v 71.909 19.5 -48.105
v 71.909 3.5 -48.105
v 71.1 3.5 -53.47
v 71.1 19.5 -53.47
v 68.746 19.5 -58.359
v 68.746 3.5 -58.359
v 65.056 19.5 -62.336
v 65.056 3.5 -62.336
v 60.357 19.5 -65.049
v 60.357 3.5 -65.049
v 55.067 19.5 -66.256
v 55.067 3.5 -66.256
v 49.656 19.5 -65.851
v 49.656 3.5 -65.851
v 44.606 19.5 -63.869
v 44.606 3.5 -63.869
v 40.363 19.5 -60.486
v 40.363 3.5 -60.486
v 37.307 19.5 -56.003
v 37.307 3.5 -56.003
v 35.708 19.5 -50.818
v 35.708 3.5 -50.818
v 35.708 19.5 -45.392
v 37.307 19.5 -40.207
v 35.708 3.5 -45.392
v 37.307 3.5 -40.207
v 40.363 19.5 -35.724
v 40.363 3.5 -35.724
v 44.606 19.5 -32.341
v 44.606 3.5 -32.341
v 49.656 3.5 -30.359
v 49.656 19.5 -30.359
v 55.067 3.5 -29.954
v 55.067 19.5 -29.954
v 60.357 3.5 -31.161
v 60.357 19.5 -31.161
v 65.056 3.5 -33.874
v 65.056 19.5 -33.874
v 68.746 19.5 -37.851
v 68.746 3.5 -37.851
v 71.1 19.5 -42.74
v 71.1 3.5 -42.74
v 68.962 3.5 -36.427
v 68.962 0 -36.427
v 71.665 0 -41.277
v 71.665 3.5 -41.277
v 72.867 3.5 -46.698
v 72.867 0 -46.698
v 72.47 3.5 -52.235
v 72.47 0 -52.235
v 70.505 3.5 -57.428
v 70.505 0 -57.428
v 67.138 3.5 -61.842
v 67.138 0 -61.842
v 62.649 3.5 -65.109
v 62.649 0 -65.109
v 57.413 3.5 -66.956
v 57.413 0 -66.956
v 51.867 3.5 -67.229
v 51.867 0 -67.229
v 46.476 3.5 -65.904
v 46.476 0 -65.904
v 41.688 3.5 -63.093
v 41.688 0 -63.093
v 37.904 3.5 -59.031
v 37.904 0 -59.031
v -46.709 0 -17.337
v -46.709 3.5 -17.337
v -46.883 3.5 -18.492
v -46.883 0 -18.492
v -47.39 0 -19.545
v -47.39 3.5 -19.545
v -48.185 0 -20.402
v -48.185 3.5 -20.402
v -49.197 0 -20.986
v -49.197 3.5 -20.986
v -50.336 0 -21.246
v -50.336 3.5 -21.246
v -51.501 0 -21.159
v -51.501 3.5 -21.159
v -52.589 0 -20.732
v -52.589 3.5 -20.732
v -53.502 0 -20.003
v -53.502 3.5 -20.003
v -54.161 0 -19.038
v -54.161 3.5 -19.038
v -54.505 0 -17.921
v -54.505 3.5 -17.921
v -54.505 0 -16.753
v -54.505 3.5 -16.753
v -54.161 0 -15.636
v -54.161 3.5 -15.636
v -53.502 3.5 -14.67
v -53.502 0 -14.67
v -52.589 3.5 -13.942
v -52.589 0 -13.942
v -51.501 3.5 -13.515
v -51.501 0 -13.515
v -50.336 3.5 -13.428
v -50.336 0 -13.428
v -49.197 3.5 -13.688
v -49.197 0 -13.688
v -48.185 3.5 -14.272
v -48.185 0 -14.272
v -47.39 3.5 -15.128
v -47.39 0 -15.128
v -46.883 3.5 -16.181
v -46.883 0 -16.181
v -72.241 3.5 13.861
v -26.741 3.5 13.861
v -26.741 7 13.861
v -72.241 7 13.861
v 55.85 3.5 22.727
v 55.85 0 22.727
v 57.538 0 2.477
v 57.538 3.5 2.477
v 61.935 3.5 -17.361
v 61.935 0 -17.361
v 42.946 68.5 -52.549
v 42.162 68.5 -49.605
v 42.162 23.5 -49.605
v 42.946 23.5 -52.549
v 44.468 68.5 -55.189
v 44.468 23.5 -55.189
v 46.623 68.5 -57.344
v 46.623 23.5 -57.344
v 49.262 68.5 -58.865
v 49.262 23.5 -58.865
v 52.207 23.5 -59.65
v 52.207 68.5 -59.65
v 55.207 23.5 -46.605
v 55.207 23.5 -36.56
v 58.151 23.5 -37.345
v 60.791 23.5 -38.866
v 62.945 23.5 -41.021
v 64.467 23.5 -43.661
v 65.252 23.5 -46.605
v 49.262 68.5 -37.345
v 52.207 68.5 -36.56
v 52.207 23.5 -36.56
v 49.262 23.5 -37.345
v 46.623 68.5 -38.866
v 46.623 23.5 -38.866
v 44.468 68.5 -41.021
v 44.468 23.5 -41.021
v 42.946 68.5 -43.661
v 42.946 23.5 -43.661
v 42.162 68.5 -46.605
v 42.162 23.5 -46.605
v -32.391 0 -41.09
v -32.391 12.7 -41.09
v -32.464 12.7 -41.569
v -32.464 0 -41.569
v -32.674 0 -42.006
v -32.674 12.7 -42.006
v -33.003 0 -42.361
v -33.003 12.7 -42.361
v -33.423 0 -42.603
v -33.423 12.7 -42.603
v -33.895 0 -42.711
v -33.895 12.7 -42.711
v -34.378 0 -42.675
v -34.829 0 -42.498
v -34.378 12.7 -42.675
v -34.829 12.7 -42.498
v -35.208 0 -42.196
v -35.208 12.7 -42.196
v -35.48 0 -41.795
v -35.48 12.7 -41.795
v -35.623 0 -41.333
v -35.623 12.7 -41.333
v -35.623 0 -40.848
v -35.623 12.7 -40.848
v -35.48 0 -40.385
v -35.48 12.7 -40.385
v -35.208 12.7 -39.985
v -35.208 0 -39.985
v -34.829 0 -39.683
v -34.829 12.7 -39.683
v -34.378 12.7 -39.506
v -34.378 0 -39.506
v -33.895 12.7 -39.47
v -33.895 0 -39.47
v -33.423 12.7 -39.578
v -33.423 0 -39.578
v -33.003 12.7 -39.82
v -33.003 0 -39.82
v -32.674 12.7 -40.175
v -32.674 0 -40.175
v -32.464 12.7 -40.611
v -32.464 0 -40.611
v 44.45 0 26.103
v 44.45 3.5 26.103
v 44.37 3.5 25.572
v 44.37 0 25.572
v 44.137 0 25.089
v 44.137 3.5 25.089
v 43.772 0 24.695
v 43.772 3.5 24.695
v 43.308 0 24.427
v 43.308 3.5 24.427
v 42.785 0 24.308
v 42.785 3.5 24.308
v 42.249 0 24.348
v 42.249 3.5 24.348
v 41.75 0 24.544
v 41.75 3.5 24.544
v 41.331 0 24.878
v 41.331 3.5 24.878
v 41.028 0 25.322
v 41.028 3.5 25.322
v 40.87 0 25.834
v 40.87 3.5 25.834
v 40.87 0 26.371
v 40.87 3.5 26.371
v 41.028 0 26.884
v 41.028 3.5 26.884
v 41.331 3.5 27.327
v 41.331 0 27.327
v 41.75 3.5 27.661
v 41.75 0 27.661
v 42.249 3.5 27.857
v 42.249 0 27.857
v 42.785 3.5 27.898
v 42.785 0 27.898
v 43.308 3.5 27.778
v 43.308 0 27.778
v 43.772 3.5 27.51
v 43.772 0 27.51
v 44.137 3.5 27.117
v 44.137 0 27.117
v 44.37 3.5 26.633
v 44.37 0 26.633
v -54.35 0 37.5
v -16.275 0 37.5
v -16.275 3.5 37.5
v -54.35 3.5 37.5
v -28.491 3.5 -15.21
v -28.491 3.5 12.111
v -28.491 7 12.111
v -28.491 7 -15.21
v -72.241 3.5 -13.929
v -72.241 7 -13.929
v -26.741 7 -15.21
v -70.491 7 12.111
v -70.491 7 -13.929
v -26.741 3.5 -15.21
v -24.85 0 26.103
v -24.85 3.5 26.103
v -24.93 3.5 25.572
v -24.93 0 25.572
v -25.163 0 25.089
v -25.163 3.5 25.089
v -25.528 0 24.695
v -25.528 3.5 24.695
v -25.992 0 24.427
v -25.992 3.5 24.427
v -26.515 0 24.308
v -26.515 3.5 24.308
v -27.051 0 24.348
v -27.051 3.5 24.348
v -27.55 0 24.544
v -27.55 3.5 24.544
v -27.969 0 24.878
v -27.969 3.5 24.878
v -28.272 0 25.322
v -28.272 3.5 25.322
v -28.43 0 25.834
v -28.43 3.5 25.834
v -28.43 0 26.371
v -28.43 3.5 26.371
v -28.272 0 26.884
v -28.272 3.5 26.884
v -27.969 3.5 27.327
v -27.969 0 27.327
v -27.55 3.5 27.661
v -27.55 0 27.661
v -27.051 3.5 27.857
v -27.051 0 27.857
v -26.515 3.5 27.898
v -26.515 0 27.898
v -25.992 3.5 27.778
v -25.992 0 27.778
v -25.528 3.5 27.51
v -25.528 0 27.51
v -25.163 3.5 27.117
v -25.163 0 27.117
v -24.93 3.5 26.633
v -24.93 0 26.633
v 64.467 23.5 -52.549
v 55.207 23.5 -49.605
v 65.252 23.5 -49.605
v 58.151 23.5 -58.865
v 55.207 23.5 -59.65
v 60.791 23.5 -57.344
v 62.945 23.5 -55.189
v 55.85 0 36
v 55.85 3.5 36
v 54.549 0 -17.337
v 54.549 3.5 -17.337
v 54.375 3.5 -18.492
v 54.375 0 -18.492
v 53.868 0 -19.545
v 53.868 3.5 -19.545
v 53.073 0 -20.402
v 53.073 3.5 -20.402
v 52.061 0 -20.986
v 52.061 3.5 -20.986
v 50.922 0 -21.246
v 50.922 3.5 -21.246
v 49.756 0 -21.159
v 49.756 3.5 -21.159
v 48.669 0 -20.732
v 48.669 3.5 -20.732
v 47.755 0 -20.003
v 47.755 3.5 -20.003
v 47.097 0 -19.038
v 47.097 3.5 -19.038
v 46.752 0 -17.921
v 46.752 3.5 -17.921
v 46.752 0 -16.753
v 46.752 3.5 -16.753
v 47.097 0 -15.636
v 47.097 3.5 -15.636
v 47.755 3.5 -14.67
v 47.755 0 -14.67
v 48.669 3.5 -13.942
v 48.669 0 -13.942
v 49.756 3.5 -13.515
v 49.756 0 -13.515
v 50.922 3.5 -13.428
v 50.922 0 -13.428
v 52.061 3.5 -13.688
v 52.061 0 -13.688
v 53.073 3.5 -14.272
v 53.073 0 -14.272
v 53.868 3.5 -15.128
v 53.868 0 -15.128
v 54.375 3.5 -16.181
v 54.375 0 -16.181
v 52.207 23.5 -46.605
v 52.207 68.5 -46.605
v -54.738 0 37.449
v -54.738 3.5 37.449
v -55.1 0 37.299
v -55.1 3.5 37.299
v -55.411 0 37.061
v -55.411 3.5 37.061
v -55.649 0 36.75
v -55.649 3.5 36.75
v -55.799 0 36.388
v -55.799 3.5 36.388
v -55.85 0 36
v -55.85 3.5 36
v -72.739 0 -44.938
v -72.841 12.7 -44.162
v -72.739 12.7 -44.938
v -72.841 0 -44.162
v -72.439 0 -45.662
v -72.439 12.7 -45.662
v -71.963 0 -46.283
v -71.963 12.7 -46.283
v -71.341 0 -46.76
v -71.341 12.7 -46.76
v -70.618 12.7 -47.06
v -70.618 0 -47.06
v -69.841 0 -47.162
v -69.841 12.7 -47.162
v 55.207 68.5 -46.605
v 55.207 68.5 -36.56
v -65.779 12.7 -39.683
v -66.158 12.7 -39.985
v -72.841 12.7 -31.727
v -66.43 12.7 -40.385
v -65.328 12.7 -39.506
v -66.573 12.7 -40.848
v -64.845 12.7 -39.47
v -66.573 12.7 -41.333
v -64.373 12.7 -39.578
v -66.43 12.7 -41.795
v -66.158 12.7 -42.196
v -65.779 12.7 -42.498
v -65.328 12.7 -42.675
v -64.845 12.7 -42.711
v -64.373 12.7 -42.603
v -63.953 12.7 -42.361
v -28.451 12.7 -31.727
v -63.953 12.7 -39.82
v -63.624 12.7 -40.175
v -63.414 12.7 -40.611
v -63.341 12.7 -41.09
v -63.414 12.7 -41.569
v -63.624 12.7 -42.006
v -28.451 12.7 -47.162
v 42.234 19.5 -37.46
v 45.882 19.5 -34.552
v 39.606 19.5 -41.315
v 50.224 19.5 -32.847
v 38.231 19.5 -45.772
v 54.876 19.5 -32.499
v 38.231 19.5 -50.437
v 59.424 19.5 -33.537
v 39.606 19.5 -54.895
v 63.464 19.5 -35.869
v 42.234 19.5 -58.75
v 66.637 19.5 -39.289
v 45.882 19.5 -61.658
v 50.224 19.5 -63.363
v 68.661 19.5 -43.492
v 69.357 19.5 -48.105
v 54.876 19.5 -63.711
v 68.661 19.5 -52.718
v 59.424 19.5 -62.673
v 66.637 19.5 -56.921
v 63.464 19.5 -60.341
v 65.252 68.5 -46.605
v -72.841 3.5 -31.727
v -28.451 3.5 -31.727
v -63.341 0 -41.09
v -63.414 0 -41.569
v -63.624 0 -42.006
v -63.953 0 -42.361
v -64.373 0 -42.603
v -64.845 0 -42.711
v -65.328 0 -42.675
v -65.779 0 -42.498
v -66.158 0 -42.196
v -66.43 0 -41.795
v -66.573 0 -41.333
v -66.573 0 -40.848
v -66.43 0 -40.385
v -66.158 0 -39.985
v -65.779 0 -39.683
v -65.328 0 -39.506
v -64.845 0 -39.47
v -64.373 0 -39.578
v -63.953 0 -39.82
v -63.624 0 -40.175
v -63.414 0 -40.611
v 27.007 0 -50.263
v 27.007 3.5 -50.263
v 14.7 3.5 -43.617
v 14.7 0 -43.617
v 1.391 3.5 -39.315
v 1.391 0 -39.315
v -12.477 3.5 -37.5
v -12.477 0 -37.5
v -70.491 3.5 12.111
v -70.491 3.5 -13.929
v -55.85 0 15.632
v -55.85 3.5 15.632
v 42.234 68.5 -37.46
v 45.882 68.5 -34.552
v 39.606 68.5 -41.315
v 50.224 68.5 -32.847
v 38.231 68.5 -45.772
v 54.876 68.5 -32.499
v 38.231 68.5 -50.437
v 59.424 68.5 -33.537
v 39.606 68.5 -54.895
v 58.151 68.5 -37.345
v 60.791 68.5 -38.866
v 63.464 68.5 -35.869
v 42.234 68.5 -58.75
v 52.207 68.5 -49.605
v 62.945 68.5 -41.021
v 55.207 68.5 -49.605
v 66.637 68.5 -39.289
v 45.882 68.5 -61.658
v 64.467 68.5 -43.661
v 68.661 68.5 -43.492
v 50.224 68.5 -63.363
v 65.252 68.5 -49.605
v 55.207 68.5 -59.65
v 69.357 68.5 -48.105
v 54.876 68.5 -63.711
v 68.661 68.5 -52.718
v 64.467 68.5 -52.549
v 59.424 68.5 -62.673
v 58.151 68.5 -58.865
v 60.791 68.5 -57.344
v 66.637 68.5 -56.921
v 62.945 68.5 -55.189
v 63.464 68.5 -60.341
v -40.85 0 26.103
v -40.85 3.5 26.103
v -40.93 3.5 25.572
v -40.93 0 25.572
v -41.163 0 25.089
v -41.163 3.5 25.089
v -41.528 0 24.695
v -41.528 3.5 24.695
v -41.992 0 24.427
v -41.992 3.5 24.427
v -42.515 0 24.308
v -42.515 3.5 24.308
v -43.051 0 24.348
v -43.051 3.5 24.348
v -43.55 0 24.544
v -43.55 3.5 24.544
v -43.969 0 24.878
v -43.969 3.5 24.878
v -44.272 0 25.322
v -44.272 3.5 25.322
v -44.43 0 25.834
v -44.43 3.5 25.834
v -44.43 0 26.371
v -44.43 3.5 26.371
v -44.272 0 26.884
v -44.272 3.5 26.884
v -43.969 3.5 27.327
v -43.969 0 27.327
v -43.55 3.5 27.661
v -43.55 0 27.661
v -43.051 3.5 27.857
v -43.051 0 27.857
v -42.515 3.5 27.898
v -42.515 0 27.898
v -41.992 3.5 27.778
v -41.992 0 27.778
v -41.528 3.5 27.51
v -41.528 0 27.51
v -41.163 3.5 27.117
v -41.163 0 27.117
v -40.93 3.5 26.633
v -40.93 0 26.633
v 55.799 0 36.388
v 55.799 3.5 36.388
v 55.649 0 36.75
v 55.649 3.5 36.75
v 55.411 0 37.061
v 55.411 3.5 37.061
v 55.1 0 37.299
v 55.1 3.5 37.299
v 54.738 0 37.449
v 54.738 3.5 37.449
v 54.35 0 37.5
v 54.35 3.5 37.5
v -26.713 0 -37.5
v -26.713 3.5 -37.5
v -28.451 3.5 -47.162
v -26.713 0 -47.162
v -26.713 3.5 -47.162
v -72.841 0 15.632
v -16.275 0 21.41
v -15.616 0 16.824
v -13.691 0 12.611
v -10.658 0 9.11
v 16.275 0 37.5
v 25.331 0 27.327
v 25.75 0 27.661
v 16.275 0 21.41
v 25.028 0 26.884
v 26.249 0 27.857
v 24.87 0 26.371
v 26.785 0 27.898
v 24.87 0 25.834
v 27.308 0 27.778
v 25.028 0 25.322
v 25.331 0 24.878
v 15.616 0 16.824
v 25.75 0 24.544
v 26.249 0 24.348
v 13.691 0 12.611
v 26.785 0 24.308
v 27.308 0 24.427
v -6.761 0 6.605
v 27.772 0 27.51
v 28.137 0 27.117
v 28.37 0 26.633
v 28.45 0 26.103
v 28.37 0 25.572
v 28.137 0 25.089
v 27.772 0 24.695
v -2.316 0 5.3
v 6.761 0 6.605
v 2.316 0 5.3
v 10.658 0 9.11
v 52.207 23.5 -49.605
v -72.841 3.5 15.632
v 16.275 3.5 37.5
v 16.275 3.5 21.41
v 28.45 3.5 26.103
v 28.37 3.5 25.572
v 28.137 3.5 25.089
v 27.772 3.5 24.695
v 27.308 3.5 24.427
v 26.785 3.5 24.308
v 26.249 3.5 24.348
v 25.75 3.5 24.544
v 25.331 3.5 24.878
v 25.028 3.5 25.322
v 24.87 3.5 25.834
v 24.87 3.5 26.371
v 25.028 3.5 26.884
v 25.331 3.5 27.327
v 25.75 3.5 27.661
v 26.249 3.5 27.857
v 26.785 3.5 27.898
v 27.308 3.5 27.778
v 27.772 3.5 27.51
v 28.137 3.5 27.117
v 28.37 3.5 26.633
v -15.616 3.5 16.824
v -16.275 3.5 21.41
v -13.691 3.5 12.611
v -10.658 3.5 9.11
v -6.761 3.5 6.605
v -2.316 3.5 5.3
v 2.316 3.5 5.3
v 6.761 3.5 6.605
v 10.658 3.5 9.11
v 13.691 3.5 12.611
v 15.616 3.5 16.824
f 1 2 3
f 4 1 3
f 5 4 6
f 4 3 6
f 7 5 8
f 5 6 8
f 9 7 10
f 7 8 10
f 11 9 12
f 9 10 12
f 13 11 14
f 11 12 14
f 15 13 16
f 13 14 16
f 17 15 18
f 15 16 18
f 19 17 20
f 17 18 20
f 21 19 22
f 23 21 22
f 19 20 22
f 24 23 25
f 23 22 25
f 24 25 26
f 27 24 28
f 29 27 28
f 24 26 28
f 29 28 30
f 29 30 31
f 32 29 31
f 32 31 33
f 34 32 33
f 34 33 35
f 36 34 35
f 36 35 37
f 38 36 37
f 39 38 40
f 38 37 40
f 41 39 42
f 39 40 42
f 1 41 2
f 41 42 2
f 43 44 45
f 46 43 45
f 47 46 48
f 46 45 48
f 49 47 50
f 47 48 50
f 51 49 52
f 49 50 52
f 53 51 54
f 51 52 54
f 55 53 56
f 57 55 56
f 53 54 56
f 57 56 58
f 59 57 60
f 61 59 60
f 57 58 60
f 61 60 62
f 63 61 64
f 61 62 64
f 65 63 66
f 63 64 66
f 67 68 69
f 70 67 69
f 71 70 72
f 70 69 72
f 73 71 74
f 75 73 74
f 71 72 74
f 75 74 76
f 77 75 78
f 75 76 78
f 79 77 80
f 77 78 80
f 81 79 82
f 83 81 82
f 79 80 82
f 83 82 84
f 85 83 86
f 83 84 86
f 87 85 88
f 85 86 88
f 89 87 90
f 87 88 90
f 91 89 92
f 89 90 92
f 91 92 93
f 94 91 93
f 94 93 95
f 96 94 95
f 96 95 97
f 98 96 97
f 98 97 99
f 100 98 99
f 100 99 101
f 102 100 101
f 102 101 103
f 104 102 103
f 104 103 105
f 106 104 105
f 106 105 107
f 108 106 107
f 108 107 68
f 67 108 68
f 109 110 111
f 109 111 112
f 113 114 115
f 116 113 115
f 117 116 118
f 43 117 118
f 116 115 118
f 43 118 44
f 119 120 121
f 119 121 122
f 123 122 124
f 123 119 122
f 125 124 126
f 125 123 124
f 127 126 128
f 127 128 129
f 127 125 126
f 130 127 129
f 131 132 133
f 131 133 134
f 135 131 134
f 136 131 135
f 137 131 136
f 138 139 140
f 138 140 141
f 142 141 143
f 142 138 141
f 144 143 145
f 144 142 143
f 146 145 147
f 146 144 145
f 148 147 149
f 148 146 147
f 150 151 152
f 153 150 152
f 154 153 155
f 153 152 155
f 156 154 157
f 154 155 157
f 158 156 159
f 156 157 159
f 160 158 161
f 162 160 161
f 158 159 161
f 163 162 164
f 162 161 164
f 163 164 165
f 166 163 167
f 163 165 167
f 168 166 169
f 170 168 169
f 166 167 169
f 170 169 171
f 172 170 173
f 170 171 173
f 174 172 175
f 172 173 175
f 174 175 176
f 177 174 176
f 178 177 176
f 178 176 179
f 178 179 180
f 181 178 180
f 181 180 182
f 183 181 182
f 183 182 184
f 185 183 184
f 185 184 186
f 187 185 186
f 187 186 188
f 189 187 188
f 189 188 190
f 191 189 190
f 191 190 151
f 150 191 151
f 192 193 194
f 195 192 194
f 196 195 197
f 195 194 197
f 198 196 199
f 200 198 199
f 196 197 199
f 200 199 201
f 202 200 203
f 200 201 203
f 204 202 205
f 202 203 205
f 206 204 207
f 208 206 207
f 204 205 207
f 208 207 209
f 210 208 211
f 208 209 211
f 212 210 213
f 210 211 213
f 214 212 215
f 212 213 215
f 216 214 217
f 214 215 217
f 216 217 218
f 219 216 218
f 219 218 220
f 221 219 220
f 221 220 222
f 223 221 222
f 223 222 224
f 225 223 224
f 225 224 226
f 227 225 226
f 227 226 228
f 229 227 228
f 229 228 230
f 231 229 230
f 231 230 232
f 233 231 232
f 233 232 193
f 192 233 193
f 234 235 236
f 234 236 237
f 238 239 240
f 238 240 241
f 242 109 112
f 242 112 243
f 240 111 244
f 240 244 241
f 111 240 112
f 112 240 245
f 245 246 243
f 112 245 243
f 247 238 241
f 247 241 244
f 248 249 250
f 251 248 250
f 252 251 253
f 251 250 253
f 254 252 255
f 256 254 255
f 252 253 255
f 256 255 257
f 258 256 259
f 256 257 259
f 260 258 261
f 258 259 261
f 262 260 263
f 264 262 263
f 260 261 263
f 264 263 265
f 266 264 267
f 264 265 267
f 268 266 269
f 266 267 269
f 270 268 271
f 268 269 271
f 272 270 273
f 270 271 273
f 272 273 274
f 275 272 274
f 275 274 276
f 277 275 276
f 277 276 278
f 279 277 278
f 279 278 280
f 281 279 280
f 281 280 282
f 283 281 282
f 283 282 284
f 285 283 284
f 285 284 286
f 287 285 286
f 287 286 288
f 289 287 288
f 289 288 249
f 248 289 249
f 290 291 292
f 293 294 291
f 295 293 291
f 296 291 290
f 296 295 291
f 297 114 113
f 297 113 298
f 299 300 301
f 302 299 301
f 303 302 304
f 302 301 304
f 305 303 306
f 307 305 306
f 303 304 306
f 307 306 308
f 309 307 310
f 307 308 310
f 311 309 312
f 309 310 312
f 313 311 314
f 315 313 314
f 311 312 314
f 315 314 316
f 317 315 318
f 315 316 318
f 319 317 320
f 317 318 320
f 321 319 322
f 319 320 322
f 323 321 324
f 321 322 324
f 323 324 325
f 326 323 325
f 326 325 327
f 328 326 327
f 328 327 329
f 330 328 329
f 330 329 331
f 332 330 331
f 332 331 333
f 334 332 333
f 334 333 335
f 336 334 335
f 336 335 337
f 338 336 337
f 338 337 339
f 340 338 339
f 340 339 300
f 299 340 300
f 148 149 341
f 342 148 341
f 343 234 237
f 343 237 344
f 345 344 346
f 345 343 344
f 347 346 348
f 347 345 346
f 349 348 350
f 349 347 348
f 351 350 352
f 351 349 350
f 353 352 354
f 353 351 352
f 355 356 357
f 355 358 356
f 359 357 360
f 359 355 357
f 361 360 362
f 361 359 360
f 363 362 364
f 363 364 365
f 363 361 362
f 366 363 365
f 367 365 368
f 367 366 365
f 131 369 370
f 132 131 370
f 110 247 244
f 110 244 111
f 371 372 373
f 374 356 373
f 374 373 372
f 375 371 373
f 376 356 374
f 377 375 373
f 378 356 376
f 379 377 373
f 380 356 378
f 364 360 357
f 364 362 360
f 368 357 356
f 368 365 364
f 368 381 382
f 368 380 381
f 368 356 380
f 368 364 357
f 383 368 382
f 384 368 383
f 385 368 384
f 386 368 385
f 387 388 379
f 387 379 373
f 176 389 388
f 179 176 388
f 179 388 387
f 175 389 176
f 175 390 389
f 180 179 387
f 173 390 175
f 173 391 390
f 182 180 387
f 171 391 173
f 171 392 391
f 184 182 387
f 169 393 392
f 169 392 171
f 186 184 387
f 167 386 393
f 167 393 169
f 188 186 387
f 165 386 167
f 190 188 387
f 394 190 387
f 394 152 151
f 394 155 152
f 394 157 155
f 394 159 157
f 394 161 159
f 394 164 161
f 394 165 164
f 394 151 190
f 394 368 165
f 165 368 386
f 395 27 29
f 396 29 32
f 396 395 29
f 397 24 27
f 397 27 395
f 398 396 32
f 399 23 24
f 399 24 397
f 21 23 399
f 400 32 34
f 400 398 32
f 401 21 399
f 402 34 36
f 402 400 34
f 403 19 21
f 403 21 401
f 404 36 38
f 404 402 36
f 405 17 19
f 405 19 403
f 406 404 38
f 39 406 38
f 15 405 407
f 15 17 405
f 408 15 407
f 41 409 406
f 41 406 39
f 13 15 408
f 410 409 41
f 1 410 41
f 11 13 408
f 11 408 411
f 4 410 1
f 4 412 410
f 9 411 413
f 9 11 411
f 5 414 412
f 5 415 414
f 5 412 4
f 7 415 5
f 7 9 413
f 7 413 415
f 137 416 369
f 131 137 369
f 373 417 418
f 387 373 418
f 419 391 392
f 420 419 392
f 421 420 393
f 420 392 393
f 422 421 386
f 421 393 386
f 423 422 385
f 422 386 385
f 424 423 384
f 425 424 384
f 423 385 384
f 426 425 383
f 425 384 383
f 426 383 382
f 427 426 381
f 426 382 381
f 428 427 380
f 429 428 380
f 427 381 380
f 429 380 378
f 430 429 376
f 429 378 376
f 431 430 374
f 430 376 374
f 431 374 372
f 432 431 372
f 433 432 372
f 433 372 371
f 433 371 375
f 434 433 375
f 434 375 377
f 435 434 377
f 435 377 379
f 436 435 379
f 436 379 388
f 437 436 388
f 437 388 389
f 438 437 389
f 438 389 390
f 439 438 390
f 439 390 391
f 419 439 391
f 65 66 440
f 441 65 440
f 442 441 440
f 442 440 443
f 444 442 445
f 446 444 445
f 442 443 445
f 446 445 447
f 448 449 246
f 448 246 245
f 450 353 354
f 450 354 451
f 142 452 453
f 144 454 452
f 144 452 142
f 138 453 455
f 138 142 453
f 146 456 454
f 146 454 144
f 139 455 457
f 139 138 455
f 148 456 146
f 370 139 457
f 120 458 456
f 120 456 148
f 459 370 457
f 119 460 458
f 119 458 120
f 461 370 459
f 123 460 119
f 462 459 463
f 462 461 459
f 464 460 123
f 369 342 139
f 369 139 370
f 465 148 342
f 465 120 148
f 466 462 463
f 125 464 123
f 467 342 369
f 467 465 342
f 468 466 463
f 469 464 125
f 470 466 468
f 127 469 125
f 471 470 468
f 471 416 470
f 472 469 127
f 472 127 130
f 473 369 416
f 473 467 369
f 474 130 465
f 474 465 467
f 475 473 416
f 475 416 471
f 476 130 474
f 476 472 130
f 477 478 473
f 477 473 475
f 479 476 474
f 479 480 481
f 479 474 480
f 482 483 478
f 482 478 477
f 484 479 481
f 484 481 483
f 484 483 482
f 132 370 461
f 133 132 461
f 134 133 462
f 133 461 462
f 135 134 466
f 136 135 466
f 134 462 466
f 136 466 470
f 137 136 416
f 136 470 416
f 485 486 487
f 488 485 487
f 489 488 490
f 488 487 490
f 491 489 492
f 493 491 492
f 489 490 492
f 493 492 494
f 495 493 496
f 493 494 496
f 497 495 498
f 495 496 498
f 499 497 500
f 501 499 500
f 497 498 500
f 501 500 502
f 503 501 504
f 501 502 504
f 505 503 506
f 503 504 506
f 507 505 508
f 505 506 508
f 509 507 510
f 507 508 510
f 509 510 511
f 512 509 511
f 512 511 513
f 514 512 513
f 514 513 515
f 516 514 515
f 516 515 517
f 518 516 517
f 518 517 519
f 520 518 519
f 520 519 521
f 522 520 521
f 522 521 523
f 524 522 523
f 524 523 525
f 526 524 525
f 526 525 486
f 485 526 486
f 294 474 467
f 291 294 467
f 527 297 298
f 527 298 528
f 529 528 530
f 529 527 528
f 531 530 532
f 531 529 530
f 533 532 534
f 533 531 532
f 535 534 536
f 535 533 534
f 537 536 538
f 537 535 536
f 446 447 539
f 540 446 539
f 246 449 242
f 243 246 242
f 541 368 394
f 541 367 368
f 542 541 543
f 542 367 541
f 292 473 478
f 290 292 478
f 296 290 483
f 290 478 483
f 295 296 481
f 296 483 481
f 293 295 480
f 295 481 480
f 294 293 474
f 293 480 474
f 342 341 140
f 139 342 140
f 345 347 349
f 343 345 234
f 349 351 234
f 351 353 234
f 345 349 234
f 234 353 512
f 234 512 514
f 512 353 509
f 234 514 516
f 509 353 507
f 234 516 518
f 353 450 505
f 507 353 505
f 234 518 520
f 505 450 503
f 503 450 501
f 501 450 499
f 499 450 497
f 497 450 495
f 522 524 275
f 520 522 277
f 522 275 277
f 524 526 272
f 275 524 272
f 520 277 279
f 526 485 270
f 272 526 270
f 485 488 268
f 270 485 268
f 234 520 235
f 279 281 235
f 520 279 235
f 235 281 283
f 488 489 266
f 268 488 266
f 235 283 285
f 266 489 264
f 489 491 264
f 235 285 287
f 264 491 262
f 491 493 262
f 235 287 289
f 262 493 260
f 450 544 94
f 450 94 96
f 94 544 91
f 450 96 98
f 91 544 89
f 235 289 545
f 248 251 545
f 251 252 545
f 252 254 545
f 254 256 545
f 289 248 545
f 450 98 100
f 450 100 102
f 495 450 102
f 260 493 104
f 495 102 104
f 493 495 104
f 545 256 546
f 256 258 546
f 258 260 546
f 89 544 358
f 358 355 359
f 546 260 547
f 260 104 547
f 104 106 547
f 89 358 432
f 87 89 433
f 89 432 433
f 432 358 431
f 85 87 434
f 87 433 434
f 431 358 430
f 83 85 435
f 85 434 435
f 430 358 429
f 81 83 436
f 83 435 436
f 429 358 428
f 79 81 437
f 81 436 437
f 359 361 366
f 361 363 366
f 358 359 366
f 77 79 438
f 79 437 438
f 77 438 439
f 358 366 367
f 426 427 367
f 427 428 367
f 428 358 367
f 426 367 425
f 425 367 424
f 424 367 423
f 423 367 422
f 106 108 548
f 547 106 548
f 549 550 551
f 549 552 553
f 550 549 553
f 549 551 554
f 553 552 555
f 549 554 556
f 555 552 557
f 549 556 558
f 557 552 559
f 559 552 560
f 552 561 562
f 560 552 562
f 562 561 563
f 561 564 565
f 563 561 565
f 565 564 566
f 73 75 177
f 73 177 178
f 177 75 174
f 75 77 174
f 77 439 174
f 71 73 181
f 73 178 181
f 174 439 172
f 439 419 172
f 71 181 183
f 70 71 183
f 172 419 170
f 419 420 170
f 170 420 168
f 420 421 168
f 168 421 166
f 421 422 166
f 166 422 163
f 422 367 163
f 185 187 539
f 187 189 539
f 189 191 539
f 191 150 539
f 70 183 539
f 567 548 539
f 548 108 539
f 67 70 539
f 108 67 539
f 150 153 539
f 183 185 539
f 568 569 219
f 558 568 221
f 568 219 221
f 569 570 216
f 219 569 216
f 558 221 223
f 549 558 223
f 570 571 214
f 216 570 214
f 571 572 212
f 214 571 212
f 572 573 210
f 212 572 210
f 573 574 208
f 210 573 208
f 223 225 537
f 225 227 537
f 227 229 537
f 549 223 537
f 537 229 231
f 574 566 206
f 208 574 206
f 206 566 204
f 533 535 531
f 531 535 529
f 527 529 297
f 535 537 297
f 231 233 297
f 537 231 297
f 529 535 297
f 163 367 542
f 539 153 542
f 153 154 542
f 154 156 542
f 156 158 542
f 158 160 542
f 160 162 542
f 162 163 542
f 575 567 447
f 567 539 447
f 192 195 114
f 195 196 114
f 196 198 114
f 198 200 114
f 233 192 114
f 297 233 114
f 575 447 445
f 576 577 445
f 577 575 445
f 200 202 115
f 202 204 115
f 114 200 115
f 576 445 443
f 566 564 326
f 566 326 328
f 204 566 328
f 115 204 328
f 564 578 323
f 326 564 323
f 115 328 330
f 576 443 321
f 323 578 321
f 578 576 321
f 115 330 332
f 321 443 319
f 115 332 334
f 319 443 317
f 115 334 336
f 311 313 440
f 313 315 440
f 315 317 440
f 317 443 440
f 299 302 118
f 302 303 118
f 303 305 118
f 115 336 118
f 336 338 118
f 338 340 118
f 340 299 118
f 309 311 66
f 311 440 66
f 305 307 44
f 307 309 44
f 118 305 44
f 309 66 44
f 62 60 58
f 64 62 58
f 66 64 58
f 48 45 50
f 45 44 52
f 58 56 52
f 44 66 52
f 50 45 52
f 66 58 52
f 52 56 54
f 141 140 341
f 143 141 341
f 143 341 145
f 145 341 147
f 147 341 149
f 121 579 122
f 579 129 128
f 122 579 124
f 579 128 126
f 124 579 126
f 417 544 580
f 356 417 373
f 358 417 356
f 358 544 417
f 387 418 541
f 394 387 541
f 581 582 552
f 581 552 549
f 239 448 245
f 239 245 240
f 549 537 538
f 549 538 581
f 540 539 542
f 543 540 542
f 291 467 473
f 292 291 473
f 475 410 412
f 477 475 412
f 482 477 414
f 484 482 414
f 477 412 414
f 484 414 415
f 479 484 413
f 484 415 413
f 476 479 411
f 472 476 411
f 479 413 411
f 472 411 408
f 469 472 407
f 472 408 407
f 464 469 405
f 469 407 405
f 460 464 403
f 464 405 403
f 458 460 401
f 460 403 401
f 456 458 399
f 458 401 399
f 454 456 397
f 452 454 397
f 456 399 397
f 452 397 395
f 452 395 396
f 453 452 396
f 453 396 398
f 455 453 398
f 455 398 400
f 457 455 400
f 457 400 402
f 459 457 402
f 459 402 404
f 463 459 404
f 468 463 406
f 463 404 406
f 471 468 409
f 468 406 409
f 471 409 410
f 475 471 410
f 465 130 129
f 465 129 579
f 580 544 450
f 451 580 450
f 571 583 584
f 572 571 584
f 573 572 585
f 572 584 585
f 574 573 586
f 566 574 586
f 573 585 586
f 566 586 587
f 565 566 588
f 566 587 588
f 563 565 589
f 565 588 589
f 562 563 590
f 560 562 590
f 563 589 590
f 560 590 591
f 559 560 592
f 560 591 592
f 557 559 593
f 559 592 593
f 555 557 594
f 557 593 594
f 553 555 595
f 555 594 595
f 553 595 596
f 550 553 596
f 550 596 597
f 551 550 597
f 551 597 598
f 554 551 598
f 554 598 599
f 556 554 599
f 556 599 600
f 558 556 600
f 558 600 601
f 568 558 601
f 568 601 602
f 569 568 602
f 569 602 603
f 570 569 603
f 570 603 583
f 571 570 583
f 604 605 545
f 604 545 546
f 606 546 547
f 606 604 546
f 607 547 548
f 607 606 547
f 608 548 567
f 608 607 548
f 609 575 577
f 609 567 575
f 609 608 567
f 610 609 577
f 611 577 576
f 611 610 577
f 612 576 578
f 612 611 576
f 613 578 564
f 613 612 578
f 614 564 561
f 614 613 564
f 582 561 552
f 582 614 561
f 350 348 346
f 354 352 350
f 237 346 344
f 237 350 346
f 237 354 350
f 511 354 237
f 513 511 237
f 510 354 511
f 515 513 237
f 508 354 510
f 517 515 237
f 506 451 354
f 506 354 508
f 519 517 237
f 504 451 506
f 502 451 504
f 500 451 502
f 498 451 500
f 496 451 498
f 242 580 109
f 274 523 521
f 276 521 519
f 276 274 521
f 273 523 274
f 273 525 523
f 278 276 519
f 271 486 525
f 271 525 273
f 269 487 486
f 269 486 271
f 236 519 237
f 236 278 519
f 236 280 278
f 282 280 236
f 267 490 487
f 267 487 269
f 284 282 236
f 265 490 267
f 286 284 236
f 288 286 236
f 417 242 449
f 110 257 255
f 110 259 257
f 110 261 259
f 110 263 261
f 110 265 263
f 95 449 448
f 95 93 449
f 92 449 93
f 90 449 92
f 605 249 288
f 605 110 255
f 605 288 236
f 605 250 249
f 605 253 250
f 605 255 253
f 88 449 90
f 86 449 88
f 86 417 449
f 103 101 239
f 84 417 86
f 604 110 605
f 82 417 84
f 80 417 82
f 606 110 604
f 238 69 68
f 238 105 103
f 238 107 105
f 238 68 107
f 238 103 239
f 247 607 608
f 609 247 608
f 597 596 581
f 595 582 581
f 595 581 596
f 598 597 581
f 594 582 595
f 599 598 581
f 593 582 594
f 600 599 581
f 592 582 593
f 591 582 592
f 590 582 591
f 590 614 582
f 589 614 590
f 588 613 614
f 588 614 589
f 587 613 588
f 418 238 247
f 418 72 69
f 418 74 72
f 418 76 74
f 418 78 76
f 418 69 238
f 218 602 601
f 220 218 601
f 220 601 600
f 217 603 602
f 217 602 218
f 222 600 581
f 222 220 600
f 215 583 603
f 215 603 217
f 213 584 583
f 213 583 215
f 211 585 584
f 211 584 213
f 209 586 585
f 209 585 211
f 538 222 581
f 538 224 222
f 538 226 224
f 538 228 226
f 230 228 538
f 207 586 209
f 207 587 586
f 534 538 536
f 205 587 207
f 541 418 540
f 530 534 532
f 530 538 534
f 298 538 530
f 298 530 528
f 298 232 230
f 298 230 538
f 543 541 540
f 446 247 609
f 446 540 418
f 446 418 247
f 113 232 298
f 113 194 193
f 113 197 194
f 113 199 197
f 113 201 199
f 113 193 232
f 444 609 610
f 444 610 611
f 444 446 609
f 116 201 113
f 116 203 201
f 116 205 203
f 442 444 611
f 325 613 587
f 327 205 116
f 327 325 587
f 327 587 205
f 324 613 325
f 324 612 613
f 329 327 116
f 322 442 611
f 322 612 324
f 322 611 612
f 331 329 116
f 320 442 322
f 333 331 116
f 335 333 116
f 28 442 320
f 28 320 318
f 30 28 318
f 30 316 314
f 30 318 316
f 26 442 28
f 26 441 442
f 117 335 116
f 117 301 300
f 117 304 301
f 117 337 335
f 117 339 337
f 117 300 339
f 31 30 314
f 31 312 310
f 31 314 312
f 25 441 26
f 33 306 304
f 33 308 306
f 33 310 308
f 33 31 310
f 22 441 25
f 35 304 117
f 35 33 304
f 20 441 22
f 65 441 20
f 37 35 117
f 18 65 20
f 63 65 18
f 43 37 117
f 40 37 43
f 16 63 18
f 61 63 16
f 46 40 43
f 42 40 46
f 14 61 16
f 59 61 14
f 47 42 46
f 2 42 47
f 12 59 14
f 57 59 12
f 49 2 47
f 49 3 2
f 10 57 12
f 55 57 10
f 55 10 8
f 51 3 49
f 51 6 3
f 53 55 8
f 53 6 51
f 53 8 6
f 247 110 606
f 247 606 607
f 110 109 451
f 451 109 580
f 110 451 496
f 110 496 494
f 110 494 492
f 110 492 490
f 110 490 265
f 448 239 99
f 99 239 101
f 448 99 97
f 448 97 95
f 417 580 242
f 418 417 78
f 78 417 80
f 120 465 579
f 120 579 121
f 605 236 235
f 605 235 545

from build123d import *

# Parameters (mm, degrees)
BOSS_EXTRUDE1_DEPTH  = 3.5
SKETCH2_R            = 1.8
SKETCH2_R_2          = 3.920136022
CUT_EXTRUDE1_DEPTH   = 4
SKETCH3_R            = 15
BOSS_EXTRUDE2_DEPTH  = 3.5
SKETCH4_R            = 15
BOSS_EXTRUDE3_DEPTH  = 65
CUT_EXTRUDE2_DEPTH   = 45
BOSS_EXTRUDE4_DEPTH  = 3.5
SKETCH8_R            = 18.202220901
BOSS_EXTRUDE5_DEPTH  = 16
SKETCH9_R            = 15.776157057
SKETCH9_R_2          = 14
CUT_EXTRUDE3_DEPTH   = 49
BOSS_EXTRUDE6_DEPTH  = 3.5
BOSS_EXTRUDE7_DEPTH  = 3.5
SKETCH13_W           = 46.127934492
SKETCH13_H           = 9.661927398
BOSS_EXTRUDE8_DEPTH  = 3.5
SKETCH14_W           = 44.39062698
SKETCH14_H           = 15.435
BOSS_EXTRUDE9_DEPTH  = 9.2
CUT_EXTRUDE4_REACH   = 14.7
SKETCH15_R           = 1.625
FILLET3_R            = 3
SKETCH16_R           = 15.65
SKETCH16_R_2         = 14
BOSS_EXTRUDE10_DEPTH = 49


with BuildPart() as part:
    # Sketch1 → Boss-Extrude1 (new body)
    with BuildSketch(Plane(origin=(0, 0, 0), x_dir=(1, 0, 0), z_dir=(0, 1, 0))):
        with BuildLine():
            Line((-55.85, 37.5), (55.85, 37.5))
            Line((55.85, 37.5), (55.85, -36))
            ThreePointArc((55.85, -36), (55.410660172, -37.060660172), (54.35, -37.5))
            Line((54.35, -37.5), (-54.35, -37.5))
            ThreePointArc((-54.35, -37.5), (-55.410660172, -37.060660172), (-55.85, -36))
            Line((-55.85, -36), (-55.85, 37.5))
        make_face()
    extrude(amount=BOSS_EXTRUDE1_DEPTH)

    # Sketch2 → Cut-Extrude1 (cut)
    with BuildSketch(Plane(origin=(0, 3.5, 0), x_dir=(1, 0, 0), z_dir=(0, 1, 0))):
        with Locations((-42.65, -26.10257403)):
            Circle(SKETCH2_R)
        with Locations((-26.65, -26.10257403)):
            Circle(SKETCH2_R)
        with Locations((26.65, -26.10257403)):
            Circle(SKETCH2_R)
        with Locations((42.65, -26.10257403)):
            Circle(SKETCH2_R)
        with Locations((-50.62881184, 17.336768313)):
            Circle(SKETCH2_R_2)
        with Locations((50.62881184, 17.336768313)):
            Circle(SKETCH2_R_2)
        with BuildLine():
            Line((-16.275049205, -37.5), (-16.275049205, -21.409694211))
            ThreePointArc((-16.275049205, -21.409694211), (0, -5.134645006), (16.275049205, -21.409694211))
            Line((16.275049205, -21.409694211), (16.275049205, -37.5))
            Line((16.275049205, -37.5), (-16.275049205, -37.5))
        make_face()
    extrude(amount=-CUT_EXTRUDE1_DEPTH, mode=Mode.SUBTRACT)

    # Sketch3 → Boss-Extrude2 (add)
    with BuildSketch(Plane(origin=(0, 0, 0), x_dir=(1, 0, 0), z_dir=(0, 1, 0))):
        with Locations((53.706623558, 48.104964972)):
            Circle(SKETCH3_R)
    extrude(amount=BOSS_EXTRUDE2_DEPTH)

    # Sketch4 → Boss-Extrude3 (add)
    with BuildSketch(Plane(origin=(0, 3.5, 0), x_dir=(1, 0, 0), z_dir=(0, 1, 0))):
        with Locations((53.706623558, 48.104964972)):
            Circle(SKETCH4_R)
    extrude(amount=BOSS_EXTRUDE3_DEPTH)

    # Sketch5 → Cut-Extrude2 (cut)
    with BuildSketch(Plane(origin=(0, 68.5, 0), x_dir=(1, 0, 0), z_dir=(0, 1, 0))):
        with BuildLine():
            Line((42.161722237, 46.604964972), (52.206623558, 46.604964972))
            Line((52.206623558, 46.604964972), (52.206623558, 36.560063651))
            ThreePointArc((52.206623558, 36.560063651), (45.474529459, 39.872870873), (42.161722237, 46.604964972))
        make_face()
        with BuildLine():
            Line((65.251524879, 46.604964972), (55.206623558, 46.604964972))
            Line((55.206623558, 46.604964972), (55.206623558, 36.560063651))
            ThreePointArc((55.206623558, 36.560063651), (61.938717657, 39.872870873), (65.251524879, 46.604964972))
        make_face()
        with BuildLine():
            Line((55.206623558, 49.604964972), (65.251524879, 49.604964972))
            ThreePointArc((65.251524879, 49.604964972), (61.938717657, 56.337059071), (55.206623558, 59.649866293))
            Line((55.206623558, 59.649866293), (55.206623558, 49.604964972))
        make_face()
        with BuildLine():
            Line((52.206623558, 59.649866293), (52.206623558, 49.604964972))
            Line((52.206623558, 49.604964972), (42.161722237, 49.604964972))
            ThreePointArc((42.161722237, 49.604964972), (45.474529459, 56.337059071), (52.206623558, 59.649866293))
        make_face()
    extrude(amount=-CUT_EXTRUDE2_DEPTH, mode=Mode.SUBTRACT)

    # Sketch7 → Boss-Extrude4 (add)
    with BuildSketch(Plane(origin=(0, 0, 0), x_dir=(1, 0, 0), z_dir=(0, 1, 0))):
        with BuildLine():
            Line((-12.477353441, 37.5), (55.85, 37.5))
            Line((55.85, 37.5), (55.85, -22.727213829))
            ThreePointArc((55.85, -22.727213829), (59.401653411, 7.516004094), (68.962444737, 36.427208523))
            ThreePointArc((68.962444737, 36.427208523), (65.011720609, 63.638955321), (37.903565045, 59.030779228))
            ThreePointArc((37.903565045, 59.030779228), (14.699548646, 43.617215299), (-12.477353441, 37.5))
        make_face()
    extrude(amount=BOSS_EXTRUDE4_DEPTH)

    # Sketch8 → Boss-Extrude5 (add)
    with BuildSketch(Plane(origin=(0, 3.5, 0), x_dir=(1, 0, 0), z_dir=(0, 1, 0))):
        with Locations((53.706623558, 48.104964972)):
            Circle(SKETCH8_R)
    extrude(amount=BOSS_EXTRUDE5_DEPTH)

    # Sketch9 → Cut-Extrude3 (cut)
    with BuildSketch(Plane(origin=(0, 68.5, 0), x_dir=(1, 0, 0), z_dir=(0, 1, 0))):
        with Locations((53.706623558, 48.104964972)):
            Circle(SKETCH9_R)
        with Locations((53.706623558, 48.104964972)):
            Circle(SKETCH9_R_2, mode=Mode.SUBTRACT)
    extrude(amount=-CUT_EXTRUDE3_DEPTH, mode=Mode.SUBTRACT)

    # Sketch11 → Boss-Extrude6 (add)
    with BuildSketch(Plane(origin=(0, 0, 0), x_dir=(1, 0, 0), z_dir=(0, 1, 0))):
        Polygon((-55.85, 37.5), (-67.841357128, 37.5), (-72.841357128, 37.5), (-72.841357128, 32.5), (-72.841357128, -9.63182819), (-72.841357128, -15.63182819), (-66.841357128, -15.63182819), (-55.85, -15.63182819), (-55.85, -14.63182819), (-55.85, 0), align=None)
    extrude(amount=BOSS_EXTRUDE6_DEPTH)

    # Sketch12 → Boss-Extrude7 (add)
    with BuildSketch(Plane(origin=(0, 3.5, 0), x_dir=(1, 0, 0), z_dir=(0, 1, 0))):
        Polygon((-28.491357128, 15.210034265), (-26.741357128, 15.210034265), (-26.741357128, -13.861045819), (-72.241357128, -13.861045819), (-72.241357128, 13.92894421), (-71.491357128, 13.92894421), (-70.491357128, 13.92894421), (-70.491357128, -12.111045819), (-28.491357128, -12.111045819), align=None)
    extrude(amount=BOSS_EXTRUDE7_DEPTH)

    # Sketch13 → Boss-Extrude8 (add)
    with BuildSketch(Plane(origin=(0, 0, 0), x_dir=(1, 0, 0), z_dir=(0, 1, 0))):
        with Locations((-49.777389882, 42.330963699)):
            Rectangle(SKETCH13_W, SKETCH13_H)
    extrude(amount=BOSS_EXTRUDE8_DEPTH)

    # Sketch14 → Boss-Extrude9 (add)
    with BuildSketch(Plane(origin=(0, 3.5, 0), x_dir=(1, 0, 0), z_dir=(0, 1, 0))):
        with Locations((-50.646043638, 39.444427398)):
            Rectangle(SKETCH14_W, SKETCH14_H)
    extrude(amount=BOSS_EXTRUDE9_DEPTH)

    # Sketch15 → Cut-Extrude4 (cut, up to next)
    with BuildSketch(Plane(origin=(0, 12.7, 0), x_dir=(1, 0, 0), z_dir=(0, 1, 0)), mode=Mode.PRIVATE) as cut_extrude4_sk1:
        with Locations((-64.966357128, 41.090370398)):
            Circle(SKETCH15_R)
    cut_extrude4_tool1 = extrude(cut_extrude4_sk1.sketch, amount=-CUT_EXTRUDE4_REACH, mode=Mode.PRIVATE) & part.part
    add(cut_extrude4_tool1.solids().sort_by_distance((-64.966357, 12.7, -41.09037))[0], mode=Mode.SUBTRACT)
    # Sketch15 → Cut-Extrude4 (cut, up to next)
    with BuildSketch(Plane(origin=(0, 12.7, 0), x_dir=(1, 0, 0), z_dir=(0, 1, 0)), mode=Mode.PRIVATE) as cut_extrude4_sk2:
        with Locations((-34.016357128, 41.090370398)):
            Circle(SKETCH15_R)
    cut_extrude4_tool2 = extrude(cut_extrude4_sk2.sketch, amount=-CUT_EXTRUDE4_REACH, mode=Mode.PRIVATE) & part.part
    add(cut_extrude4_tool2.solids().sort_by_distance((-34.016357, 12.7, -41.09037))[0], mode=Mode.SUBTRACT)

    # Fillet3
    fillet3_edges = [part.edges().sort_by_distance(p)[0] for p in [
        (-72.841357128, 6.35, -47.161927398),
    ]]
    fillet(fillet3_edges, radius=FILLET3_R)

    # Sketch16 → Boss-Extrude10 (add)
    with BuildSketch(Plane(origin=(0, 19.5, 0), x_dir=(1, 0, 0), z_dir=(0, 1, 0))):
        with Locations((53.706623558, 48.104964972)):
            Circle(SKETCH16_R)
        with Locations((53.706623558, 48.104964972)):
            Circle(SKETCH16_R_2, mode=Mode.SUBTRACT)
    extrude(amount=BOSS_EXTRUDE10_DEPTH)


solid = part.part
